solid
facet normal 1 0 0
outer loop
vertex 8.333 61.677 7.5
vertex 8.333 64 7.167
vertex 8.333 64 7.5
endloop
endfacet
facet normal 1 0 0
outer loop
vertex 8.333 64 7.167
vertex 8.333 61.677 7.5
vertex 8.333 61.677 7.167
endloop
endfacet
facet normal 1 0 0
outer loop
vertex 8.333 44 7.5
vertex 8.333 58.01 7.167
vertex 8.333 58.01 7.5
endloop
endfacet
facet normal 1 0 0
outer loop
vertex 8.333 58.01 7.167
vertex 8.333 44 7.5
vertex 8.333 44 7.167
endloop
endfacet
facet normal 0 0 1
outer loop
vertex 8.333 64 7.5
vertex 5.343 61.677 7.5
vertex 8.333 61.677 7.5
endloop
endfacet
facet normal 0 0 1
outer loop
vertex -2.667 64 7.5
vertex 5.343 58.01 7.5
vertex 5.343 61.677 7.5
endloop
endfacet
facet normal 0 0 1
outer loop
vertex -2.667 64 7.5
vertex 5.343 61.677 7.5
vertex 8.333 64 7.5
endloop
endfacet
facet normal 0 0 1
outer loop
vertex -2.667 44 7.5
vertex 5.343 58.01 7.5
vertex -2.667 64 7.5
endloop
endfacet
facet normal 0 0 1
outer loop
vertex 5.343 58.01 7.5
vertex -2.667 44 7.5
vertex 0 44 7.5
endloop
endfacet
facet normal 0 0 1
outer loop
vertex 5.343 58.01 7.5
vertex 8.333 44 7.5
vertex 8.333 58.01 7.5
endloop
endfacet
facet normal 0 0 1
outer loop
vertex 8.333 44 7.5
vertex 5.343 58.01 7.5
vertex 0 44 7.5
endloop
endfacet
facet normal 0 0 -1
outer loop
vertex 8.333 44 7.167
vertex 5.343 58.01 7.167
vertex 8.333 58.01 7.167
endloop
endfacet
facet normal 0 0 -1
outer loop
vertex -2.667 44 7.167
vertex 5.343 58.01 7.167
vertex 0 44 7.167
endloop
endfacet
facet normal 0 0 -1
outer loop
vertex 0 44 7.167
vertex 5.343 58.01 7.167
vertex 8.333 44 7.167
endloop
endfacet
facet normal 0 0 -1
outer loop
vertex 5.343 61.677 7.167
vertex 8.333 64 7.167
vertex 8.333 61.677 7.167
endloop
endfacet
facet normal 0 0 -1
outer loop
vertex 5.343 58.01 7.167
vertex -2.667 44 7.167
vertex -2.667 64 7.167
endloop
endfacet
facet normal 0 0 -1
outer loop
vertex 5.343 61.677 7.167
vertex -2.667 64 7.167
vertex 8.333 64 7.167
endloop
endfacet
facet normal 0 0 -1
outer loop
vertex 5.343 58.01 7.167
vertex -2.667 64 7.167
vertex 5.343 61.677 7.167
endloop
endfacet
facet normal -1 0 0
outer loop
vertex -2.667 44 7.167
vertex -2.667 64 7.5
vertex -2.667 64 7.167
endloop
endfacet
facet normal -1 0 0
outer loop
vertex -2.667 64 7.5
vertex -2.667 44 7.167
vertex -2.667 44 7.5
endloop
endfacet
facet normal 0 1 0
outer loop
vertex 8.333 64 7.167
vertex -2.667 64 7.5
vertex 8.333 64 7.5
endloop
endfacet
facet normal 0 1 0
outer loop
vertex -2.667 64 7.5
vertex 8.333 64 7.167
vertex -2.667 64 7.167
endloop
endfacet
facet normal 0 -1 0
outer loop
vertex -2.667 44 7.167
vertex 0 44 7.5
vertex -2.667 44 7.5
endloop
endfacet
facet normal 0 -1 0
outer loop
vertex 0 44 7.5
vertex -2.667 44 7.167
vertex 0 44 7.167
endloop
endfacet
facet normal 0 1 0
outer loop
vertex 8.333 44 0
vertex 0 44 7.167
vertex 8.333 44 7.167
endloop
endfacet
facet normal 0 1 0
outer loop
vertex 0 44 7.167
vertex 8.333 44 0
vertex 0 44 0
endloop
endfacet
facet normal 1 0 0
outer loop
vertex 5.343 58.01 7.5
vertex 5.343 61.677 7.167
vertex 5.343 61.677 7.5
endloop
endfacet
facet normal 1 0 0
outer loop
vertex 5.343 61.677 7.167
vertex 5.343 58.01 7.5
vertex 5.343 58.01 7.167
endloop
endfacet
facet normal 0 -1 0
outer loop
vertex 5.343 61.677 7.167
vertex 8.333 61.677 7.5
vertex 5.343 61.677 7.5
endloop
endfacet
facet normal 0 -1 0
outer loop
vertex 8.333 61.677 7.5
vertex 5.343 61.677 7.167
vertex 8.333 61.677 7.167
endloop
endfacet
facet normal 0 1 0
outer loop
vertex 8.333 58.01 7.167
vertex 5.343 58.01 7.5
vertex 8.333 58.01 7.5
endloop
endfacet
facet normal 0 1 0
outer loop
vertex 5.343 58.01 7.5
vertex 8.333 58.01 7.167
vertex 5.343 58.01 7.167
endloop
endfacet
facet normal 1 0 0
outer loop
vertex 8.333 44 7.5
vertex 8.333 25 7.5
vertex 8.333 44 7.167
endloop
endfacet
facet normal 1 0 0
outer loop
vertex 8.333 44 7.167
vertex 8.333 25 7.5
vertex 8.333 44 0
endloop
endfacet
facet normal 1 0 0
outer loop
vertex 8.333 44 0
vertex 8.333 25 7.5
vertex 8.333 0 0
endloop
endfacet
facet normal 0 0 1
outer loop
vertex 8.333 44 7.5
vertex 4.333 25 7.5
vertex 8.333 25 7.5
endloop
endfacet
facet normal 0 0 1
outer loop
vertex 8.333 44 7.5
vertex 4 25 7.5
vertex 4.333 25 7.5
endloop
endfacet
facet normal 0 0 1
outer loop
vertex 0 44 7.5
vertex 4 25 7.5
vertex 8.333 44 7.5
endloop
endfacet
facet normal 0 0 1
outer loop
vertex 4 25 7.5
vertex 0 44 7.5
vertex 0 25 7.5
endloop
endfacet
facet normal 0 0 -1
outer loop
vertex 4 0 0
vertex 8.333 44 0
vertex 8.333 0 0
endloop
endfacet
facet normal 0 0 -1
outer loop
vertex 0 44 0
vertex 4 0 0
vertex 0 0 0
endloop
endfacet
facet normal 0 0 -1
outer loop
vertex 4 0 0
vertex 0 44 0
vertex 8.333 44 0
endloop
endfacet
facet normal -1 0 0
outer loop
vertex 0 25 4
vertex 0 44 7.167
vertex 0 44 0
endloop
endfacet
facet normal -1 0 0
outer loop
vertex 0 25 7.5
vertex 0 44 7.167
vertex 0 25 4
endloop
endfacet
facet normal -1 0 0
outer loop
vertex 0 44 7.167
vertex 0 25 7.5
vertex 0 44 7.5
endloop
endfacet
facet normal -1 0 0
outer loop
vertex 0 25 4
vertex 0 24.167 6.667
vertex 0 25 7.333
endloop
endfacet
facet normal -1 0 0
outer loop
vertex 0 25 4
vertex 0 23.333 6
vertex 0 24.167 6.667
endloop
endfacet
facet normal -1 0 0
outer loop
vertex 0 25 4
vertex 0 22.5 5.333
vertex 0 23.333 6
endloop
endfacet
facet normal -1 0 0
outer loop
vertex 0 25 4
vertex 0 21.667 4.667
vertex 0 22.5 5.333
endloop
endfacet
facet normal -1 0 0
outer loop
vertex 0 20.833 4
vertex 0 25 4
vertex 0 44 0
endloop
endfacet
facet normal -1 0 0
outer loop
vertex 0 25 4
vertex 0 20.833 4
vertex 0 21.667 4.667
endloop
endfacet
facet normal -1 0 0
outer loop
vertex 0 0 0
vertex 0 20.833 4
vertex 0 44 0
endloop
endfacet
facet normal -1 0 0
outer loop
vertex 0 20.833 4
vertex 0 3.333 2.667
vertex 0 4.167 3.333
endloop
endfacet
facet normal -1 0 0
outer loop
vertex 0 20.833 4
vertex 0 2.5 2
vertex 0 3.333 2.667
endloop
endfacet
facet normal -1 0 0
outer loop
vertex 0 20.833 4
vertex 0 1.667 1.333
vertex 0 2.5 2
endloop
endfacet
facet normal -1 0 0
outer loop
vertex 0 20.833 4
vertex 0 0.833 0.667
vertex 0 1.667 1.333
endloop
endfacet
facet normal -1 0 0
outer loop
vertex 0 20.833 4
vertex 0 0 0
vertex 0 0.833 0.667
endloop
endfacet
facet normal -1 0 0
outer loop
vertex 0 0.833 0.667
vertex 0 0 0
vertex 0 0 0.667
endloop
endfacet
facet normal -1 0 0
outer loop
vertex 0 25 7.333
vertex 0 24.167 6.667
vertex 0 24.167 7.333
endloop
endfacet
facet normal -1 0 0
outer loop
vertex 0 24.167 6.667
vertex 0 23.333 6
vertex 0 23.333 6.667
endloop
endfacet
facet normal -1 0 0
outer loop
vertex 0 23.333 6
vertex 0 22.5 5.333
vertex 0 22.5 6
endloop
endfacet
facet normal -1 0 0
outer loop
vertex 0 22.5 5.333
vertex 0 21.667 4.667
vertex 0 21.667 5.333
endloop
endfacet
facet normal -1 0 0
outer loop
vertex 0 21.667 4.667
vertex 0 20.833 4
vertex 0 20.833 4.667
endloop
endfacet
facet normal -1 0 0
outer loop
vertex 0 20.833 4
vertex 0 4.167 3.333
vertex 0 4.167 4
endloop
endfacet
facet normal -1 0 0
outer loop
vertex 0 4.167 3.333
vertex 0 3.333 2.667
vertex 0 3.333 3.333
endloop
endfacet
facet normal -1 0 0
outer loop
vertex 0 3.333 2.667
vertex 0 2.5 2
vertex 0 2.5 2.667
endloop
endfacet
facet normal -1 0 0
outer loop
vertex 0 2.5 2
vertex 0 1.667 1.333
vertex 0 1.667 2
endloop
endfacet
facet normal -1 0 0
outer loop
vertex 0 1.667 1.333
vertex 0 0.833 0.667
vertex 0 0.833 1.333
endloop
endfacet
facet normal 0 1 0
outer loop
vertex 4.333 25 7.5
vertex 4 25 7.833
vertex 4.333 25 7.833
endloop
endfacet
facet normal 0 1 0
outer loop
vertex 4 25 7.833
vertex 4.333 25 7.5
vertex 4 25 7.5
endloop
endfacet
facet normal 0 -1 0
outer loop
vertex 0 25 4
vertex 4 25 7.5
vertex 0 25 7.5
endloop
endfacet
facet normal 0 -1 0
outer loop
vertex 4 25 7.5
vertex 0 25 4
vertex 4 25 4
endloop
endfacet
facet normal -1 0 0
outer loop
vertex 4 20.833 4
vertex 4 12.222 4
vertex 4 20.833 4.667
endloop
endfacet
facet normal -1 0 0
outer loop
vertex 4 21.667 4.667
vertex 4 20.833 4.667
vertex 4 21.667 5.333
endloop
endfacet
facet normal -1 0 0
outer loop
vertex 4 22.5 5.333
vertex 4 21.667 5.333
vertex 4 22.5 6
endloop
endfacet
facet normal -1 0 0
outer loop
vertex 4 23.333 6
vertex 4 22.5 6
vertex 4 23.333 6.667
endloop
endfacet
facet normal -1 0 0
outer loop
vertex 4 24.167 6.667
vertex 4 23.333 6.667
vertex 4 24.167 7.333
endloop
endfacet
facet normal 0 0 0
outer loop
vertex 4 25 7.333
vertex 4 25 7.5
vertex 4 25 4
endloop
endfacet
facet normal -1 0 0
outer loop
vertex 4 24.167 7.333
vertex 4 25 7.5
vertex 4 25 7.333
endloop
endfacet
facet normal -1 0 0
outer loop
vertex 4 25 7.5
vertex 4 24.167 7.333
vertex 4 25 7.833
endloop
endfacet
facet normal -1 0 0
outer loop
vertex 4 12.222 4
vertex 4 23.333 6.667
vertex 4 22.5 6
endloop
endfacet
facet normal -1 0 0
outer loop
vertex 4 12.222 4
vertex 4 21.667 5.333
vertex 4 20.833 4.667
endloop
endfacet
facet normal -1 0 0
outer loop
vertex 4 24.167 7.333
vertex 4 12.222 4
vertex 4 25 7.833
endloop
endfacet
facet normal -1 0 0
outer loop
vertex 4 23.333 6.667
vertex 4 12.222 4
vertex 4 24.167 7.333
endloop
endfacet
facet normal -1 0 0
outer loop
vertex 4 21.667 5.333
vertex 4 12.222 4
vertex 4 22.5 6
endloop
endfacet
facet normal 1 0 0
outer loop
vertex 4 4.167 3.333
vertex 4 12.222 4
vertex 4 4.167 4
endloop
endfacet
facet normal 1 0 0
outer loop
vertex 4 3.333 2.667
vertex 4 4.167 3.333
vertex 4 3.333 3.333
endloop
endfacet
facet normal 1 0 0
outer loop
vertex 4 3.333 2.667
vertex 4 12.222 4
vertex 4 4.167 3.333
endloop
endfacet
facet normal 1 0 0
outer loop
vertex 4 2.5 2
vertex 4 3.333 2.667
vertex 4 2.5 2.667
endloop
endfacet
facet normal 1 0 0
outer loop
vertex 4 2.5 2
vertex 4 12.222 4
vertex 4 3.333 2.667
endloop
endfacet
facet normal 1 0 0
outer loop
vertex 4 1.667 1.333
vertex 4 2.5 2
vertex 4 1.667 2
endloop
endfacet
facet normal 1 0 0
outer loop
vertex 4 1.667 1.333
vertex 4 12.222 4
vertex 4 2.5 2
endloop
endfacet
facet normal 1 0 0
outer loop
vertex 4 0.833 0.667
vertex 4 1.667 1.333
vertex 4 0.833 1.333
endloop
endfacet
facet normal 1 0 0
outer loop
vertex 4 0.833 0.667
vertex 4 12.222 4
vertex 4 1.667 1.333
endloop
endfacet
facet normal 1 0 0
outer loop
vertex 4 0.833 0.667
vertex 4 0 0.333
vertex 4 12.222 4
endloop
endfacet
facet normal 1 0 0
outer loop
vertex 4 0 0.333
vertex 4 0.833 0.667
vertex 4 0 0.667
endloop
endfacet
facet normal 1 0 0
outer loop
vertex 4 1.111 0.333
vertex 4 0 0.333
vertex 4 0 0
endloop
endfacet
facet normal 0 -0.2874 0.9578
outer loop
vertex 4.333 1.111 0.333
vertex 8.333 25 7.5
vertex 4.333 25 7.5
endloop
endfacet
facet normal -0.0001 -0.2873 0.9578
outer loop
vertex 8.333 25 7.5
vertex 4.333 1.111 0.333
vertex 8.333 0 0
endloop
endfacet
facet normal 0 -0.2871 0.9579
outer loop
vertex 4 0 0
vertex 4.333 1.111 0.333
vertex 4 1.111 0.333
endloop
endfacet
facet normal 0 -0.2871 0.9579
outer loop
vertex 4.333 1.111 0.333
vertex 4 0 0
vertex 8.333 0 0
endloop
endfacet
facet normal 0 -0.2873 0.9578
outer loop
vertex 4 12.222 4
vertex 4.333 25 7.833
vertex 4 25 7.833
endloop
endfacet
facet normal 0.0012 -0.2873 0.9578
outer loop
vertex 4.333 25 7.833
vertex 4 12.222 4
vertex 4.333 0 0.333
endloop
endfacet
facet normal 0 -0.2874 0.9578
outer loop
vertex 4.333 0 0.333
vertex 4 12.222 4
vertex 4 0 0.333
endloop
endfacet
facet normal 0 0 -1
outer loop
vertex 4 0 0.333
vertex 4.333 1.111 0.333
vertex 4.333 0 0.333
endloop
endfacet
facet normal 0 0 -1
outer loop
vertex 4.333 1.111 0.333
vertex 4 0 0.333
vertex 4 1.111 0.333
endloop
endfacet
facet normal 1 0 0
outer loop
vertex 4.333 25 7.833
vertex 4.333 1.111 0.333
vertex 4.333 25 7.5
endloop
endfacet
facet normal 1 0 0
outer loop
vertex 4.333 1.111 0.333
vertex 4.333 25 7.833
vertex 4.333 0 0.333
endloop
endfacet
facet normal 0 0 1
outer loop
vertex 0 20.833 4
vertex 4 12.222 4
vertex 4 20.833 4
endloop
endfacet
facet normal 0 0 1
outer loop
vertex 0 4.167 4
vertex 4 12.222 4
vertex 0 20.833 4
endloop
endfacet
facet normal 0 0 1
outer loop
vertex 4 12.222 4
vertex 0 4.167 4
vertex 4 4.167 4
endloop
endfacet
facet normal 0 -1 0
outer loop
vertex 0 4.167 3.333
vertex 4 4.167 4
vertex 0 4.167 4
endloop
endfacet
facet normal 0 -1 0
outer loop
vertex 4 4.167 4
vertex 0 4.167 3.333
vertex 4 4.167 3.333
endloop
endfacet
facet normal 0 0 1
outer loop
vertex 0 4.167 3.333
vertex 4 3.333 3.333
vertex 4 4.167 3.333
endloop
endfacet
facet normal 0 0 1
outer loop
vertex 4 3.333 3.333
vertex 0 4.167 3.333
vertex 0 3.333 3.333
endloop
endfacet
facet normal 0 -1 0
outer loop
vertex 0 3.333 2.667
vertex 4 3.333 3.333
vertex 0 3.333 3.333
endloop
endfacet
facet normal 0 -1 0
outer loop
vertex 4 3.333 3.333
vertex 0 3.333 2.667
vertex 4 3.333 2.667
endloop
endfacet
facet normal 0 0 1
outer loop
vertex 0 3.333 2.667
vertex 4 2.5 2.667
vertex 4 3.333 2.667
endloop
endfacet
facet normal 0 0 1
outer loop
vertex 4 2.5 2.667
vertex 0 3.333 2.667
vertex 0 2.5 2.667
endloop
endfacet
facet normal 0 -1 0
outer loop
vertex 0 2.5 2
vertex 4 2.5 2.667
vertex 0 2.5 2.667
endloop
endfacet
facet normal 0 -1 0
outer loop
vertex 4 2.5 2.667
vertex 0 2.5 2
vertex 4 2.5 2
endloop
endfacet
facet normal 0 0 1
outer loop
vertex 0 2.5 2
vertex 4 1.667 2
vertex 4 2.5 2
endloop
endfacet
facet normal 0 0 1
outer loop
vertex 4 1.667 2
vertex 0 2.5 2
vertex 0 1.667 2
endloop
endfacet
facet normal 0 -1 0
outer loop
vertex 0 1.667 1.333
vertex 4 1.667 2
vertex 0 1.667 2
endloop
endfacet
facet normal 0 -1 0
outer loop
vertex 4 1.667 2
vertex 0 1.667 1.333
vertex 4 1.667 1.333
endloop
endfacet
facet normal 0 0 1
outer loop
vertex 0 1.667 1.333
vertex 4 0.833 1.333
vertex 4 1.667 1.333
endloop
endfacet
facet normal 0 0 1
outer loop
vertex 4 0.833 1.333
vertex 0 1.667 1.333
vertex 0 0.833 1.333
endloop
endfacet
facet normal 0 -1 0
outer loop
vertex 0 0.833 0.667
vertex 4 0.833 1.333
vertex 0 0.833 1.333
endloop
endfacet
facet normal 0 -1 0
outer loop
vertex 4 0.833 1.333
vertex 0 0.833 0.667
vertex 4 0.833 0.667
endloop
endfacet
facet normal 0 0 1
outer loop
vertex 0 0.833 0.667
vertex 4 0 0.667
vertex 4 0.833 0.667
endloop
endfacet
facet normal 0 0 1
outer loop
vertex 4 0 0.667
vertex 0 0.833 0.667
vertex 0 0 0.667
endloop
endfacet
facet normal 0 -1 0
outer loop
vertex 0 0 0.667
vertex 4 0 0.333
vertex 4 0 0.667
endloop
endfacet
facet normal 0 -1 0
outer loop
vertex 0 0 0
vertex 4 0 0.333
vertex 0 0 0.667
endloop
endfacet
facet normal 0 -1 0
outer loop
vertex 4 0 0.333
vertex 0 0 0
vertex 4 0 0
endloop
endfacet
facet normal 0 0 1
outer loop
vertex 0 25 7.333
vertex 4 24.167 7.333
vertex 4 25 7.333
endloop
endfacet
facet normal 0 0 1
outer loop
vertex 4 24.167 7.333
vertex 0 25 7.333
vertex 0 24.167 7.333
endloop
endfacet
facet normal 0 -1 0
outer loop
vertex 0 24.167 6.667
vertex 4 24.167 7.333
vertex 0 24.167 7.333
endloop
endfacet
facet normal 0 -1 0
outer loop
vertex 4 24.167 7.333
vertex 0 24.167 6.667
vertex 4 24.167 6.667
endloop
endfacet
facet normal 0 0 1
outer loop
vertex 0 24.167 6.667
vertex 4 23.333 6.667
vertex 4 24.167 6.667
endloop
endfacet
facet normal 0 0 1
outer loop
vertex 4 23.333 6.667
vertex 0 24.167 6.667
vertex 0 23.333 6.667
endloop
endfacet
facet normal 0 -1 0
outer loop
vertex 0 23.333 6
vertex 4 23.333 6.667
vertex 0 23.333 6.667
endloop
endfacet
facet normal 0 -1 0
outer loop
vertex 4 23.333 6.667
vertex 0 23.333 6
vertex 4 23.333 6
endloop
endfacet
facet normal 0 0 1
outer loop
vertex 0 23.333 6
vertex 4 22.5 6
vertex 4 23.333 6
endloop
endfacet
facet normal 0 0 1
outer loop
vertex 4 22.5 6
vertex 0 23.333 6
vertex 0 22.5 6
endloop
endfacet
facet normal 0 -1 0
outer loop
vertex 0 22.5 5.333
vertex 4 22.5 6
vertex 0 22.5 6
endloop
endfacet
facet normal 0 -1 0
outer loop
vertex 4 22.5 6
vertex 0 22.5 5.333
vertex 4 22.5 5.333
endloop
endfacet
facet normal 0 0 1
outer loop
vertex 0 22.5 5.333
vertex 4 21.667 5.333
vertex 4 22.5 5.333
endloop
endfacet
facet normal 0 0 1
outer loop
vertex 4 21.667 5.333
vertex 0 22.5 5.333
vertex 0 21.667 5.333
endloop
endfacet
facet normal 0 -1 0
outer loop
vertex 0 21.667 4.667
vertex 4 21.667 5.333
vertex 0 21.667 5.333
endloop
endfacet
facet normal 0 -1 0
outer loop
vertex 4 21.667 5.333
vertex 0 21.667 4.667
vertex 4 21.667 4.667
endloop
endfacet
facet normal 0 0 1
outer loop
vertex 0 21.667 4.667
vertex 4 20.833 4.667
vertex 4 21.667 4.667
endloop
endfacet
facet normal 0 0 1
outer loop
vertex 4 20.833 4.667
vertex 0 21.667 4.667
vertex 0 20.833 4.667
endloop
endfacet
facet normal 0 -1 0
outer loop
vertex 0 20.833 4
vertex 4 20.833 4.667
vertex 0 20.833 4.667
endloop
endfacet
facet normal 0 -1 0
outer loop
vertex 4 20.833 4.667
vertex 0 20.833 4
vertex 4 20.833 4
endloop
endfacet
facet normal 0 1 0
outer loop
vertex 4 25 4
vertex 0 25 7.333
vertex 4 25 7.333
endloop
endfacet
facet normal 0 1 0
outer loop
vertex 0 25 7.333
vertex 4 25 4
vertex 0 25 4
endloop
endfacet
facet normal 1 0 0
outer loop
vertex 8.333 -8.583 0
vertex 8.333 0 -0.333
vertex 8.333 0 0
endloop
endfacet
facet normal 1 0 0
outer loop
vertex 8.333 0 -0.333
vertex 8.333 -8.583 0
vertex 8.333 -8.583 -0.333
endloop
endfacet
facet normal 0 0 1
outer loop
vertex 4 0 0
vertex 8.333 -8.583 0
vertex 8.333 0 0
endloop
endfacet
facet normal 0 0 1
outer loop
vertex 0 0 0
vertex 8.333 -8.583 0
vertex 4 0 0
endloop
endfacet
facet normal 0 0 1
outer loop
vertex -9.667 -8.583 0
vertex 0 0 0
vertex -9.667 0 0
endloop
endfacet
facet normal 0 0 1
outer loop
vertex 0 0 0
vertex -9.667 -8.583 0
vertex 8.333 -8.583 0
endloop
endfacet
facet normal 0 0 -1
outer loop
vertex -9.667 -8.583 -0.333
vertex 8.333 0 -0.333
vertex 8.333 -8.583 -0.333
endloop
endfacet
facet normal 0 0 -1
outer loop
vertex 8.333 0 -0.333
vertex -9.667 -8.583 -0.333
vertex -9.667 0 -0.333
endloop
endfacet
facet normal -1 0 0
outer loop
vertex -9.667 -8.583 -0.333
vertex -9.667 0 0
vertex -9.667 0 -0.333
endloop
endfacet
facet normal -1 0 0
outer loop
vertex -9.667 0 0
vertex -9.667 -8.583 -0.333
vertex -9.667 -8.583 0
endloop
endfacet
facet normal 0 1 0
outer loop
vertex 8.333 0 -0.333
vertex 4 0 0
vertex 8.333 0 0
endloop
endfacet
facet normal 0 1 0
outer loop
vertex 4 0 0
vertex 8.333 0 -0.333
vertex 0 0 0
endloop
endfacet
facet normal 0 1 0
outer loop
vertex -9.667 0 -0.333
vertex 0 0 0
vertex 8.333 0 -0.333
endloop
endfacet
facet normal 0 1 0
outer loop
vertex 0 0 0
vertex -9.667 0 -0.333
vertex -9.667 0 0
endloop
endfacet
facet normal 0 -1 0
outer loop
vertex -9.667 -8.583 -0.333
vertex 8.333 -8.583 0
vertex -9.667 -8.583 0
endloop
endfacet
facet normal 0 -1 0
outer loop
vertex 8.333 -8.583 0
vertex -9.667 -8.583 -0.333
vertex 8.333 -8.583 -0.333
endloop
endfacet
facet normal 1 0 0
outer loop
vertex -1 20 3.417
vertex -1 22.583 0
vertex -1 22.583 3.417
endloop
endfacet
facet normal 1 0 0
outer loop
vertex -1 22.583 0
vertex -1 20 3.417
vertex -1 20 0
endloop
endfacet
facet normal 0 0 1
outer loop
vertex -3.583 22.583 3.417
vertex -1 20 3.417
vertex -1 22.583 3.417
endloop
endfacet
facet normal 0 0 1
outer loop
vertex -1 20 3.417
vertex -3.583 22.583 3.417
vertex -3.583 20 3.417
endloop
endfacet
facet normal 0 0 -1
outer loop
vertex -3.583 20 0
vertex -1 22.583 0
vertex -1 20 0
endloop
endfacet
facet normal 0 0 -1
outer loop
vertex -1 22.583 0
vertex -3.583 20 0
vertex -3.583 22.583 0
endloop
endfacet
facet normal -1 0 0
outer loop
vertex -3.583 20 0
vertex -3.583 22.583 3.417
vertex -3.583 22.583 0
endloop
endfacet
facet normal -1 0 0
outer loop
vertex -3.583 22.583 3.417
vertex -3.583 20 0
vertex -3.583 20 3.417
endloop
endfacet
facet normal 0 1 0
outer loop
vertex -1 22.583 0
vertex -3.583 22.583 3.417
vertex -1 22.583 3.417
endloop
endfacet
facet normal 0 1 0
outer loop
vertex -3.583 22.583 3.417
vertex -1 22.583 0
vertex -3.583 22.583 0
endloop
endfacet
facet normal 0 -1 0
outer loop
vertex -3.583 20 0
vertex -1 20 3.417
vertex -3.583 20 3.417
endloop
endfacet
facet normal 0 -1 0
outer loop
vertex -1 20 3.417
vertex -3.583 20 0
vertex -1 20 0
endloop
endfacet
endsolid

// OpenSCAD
function in2ft(inches) = inches/12;
plane = in2ft(4);

stair_run = in2ft(10);
stair_rise = in2ft(8);
top_stair_count = 5;

width = 8 + plane;
depth = 44;
height = 7.5;
pad = 19;
ramp_w = in2ft(48 + 4);
// ramp_w = width;

stair_w = width - ramp_w;
stair_d = depth - pad;

module ramp(w, d, angle) {
  h = d * tan(angle);
  translate([0, 0, h])
  rotate([0, 90, 0])
  linear_extrude(w)
    polygon([
      [0, d],
      [h, d],
      [h, 0],
    ]);
}

module ramp_points(w, d, h) {
  angle = atan(d / h);
  echo(str("ramp angle = ", 90 - angle));
  translate([0, 0, h])
  rotate([0, 90, 0])
  linear_extrude(w)
    polygon([
      [0, d],
      [h, d],
      [h, 0],
    ]);
}

module stairs(count, w) {
  rotate([90, 0, 90])
    linear_extrude(w)
    for (i=[0:count-1]) {
      translate([stair_run * i, 0, 0])
        square([stair_run, stair_rise * (i + 1)]);
    }
}

// Flat Pad
translate([0, stair_d, 0])
  cube([width, pad, height]);

// Ramp
color("green")
translate([stair_w, 0, 0])
  ramp_points(ramp_w, stair_d, height);
color("green")
translate([stair_w, 0, plane])
  ramp_points(plane, stair_d, height);

// Stairs
num_stairs = ceil(height / stair_rise) - 1;
base_stairs = num_stairs - top_stair_count;

stairs(base_stairs, stair_w);
translate([0, stair_run * base_stairs, 0])
  cube([stair_w, stair_d - (stair_run * base_stairs), stair_rise * base_stairs]);

remaining_height = height - (base_stairs * stair_rise);
remaining_stairs = ceil(remaining_height / stair_rise) - 1;

translate([0, (stair_d) - (remaining_stairs * stair_run), base_stairs * stair_rise]) {
  stairs(remaining_stairs, stair_w);
}

// Bottom
bot_w = 18;
bot_d = 8 + in2ft(7);

color("teal")
translate([-bot_w + width, -bot_d, -plane])
cube([bot_w, bot_d, plane]);

// Top
top_w = 11;
top_d = 20;

color("teal")
translate([-top_w + width, depth, height - plane]) {
  difference() {
    cube([top_w, top_d, plane]);

    translate([top_w - 3 + 0.01, top_d - (3 + in2ft(8)) + 0.01 - (2 + in2ft(4)), -0.01])
    cube([3, 3 + in2ft(8), 3]);
  }
}

// AC
ac_size = [in2ft(31), in2ft(31), in2ft(35 + 6)];
if ($preview) {
  color("red")
  translate([1, 8, base_stairs * stair_rise])
    cube(ac_size);
} else {
  color("red")
  translate([-ac_size.x - 1, 20, 0])
    cube(ac_size);
}
